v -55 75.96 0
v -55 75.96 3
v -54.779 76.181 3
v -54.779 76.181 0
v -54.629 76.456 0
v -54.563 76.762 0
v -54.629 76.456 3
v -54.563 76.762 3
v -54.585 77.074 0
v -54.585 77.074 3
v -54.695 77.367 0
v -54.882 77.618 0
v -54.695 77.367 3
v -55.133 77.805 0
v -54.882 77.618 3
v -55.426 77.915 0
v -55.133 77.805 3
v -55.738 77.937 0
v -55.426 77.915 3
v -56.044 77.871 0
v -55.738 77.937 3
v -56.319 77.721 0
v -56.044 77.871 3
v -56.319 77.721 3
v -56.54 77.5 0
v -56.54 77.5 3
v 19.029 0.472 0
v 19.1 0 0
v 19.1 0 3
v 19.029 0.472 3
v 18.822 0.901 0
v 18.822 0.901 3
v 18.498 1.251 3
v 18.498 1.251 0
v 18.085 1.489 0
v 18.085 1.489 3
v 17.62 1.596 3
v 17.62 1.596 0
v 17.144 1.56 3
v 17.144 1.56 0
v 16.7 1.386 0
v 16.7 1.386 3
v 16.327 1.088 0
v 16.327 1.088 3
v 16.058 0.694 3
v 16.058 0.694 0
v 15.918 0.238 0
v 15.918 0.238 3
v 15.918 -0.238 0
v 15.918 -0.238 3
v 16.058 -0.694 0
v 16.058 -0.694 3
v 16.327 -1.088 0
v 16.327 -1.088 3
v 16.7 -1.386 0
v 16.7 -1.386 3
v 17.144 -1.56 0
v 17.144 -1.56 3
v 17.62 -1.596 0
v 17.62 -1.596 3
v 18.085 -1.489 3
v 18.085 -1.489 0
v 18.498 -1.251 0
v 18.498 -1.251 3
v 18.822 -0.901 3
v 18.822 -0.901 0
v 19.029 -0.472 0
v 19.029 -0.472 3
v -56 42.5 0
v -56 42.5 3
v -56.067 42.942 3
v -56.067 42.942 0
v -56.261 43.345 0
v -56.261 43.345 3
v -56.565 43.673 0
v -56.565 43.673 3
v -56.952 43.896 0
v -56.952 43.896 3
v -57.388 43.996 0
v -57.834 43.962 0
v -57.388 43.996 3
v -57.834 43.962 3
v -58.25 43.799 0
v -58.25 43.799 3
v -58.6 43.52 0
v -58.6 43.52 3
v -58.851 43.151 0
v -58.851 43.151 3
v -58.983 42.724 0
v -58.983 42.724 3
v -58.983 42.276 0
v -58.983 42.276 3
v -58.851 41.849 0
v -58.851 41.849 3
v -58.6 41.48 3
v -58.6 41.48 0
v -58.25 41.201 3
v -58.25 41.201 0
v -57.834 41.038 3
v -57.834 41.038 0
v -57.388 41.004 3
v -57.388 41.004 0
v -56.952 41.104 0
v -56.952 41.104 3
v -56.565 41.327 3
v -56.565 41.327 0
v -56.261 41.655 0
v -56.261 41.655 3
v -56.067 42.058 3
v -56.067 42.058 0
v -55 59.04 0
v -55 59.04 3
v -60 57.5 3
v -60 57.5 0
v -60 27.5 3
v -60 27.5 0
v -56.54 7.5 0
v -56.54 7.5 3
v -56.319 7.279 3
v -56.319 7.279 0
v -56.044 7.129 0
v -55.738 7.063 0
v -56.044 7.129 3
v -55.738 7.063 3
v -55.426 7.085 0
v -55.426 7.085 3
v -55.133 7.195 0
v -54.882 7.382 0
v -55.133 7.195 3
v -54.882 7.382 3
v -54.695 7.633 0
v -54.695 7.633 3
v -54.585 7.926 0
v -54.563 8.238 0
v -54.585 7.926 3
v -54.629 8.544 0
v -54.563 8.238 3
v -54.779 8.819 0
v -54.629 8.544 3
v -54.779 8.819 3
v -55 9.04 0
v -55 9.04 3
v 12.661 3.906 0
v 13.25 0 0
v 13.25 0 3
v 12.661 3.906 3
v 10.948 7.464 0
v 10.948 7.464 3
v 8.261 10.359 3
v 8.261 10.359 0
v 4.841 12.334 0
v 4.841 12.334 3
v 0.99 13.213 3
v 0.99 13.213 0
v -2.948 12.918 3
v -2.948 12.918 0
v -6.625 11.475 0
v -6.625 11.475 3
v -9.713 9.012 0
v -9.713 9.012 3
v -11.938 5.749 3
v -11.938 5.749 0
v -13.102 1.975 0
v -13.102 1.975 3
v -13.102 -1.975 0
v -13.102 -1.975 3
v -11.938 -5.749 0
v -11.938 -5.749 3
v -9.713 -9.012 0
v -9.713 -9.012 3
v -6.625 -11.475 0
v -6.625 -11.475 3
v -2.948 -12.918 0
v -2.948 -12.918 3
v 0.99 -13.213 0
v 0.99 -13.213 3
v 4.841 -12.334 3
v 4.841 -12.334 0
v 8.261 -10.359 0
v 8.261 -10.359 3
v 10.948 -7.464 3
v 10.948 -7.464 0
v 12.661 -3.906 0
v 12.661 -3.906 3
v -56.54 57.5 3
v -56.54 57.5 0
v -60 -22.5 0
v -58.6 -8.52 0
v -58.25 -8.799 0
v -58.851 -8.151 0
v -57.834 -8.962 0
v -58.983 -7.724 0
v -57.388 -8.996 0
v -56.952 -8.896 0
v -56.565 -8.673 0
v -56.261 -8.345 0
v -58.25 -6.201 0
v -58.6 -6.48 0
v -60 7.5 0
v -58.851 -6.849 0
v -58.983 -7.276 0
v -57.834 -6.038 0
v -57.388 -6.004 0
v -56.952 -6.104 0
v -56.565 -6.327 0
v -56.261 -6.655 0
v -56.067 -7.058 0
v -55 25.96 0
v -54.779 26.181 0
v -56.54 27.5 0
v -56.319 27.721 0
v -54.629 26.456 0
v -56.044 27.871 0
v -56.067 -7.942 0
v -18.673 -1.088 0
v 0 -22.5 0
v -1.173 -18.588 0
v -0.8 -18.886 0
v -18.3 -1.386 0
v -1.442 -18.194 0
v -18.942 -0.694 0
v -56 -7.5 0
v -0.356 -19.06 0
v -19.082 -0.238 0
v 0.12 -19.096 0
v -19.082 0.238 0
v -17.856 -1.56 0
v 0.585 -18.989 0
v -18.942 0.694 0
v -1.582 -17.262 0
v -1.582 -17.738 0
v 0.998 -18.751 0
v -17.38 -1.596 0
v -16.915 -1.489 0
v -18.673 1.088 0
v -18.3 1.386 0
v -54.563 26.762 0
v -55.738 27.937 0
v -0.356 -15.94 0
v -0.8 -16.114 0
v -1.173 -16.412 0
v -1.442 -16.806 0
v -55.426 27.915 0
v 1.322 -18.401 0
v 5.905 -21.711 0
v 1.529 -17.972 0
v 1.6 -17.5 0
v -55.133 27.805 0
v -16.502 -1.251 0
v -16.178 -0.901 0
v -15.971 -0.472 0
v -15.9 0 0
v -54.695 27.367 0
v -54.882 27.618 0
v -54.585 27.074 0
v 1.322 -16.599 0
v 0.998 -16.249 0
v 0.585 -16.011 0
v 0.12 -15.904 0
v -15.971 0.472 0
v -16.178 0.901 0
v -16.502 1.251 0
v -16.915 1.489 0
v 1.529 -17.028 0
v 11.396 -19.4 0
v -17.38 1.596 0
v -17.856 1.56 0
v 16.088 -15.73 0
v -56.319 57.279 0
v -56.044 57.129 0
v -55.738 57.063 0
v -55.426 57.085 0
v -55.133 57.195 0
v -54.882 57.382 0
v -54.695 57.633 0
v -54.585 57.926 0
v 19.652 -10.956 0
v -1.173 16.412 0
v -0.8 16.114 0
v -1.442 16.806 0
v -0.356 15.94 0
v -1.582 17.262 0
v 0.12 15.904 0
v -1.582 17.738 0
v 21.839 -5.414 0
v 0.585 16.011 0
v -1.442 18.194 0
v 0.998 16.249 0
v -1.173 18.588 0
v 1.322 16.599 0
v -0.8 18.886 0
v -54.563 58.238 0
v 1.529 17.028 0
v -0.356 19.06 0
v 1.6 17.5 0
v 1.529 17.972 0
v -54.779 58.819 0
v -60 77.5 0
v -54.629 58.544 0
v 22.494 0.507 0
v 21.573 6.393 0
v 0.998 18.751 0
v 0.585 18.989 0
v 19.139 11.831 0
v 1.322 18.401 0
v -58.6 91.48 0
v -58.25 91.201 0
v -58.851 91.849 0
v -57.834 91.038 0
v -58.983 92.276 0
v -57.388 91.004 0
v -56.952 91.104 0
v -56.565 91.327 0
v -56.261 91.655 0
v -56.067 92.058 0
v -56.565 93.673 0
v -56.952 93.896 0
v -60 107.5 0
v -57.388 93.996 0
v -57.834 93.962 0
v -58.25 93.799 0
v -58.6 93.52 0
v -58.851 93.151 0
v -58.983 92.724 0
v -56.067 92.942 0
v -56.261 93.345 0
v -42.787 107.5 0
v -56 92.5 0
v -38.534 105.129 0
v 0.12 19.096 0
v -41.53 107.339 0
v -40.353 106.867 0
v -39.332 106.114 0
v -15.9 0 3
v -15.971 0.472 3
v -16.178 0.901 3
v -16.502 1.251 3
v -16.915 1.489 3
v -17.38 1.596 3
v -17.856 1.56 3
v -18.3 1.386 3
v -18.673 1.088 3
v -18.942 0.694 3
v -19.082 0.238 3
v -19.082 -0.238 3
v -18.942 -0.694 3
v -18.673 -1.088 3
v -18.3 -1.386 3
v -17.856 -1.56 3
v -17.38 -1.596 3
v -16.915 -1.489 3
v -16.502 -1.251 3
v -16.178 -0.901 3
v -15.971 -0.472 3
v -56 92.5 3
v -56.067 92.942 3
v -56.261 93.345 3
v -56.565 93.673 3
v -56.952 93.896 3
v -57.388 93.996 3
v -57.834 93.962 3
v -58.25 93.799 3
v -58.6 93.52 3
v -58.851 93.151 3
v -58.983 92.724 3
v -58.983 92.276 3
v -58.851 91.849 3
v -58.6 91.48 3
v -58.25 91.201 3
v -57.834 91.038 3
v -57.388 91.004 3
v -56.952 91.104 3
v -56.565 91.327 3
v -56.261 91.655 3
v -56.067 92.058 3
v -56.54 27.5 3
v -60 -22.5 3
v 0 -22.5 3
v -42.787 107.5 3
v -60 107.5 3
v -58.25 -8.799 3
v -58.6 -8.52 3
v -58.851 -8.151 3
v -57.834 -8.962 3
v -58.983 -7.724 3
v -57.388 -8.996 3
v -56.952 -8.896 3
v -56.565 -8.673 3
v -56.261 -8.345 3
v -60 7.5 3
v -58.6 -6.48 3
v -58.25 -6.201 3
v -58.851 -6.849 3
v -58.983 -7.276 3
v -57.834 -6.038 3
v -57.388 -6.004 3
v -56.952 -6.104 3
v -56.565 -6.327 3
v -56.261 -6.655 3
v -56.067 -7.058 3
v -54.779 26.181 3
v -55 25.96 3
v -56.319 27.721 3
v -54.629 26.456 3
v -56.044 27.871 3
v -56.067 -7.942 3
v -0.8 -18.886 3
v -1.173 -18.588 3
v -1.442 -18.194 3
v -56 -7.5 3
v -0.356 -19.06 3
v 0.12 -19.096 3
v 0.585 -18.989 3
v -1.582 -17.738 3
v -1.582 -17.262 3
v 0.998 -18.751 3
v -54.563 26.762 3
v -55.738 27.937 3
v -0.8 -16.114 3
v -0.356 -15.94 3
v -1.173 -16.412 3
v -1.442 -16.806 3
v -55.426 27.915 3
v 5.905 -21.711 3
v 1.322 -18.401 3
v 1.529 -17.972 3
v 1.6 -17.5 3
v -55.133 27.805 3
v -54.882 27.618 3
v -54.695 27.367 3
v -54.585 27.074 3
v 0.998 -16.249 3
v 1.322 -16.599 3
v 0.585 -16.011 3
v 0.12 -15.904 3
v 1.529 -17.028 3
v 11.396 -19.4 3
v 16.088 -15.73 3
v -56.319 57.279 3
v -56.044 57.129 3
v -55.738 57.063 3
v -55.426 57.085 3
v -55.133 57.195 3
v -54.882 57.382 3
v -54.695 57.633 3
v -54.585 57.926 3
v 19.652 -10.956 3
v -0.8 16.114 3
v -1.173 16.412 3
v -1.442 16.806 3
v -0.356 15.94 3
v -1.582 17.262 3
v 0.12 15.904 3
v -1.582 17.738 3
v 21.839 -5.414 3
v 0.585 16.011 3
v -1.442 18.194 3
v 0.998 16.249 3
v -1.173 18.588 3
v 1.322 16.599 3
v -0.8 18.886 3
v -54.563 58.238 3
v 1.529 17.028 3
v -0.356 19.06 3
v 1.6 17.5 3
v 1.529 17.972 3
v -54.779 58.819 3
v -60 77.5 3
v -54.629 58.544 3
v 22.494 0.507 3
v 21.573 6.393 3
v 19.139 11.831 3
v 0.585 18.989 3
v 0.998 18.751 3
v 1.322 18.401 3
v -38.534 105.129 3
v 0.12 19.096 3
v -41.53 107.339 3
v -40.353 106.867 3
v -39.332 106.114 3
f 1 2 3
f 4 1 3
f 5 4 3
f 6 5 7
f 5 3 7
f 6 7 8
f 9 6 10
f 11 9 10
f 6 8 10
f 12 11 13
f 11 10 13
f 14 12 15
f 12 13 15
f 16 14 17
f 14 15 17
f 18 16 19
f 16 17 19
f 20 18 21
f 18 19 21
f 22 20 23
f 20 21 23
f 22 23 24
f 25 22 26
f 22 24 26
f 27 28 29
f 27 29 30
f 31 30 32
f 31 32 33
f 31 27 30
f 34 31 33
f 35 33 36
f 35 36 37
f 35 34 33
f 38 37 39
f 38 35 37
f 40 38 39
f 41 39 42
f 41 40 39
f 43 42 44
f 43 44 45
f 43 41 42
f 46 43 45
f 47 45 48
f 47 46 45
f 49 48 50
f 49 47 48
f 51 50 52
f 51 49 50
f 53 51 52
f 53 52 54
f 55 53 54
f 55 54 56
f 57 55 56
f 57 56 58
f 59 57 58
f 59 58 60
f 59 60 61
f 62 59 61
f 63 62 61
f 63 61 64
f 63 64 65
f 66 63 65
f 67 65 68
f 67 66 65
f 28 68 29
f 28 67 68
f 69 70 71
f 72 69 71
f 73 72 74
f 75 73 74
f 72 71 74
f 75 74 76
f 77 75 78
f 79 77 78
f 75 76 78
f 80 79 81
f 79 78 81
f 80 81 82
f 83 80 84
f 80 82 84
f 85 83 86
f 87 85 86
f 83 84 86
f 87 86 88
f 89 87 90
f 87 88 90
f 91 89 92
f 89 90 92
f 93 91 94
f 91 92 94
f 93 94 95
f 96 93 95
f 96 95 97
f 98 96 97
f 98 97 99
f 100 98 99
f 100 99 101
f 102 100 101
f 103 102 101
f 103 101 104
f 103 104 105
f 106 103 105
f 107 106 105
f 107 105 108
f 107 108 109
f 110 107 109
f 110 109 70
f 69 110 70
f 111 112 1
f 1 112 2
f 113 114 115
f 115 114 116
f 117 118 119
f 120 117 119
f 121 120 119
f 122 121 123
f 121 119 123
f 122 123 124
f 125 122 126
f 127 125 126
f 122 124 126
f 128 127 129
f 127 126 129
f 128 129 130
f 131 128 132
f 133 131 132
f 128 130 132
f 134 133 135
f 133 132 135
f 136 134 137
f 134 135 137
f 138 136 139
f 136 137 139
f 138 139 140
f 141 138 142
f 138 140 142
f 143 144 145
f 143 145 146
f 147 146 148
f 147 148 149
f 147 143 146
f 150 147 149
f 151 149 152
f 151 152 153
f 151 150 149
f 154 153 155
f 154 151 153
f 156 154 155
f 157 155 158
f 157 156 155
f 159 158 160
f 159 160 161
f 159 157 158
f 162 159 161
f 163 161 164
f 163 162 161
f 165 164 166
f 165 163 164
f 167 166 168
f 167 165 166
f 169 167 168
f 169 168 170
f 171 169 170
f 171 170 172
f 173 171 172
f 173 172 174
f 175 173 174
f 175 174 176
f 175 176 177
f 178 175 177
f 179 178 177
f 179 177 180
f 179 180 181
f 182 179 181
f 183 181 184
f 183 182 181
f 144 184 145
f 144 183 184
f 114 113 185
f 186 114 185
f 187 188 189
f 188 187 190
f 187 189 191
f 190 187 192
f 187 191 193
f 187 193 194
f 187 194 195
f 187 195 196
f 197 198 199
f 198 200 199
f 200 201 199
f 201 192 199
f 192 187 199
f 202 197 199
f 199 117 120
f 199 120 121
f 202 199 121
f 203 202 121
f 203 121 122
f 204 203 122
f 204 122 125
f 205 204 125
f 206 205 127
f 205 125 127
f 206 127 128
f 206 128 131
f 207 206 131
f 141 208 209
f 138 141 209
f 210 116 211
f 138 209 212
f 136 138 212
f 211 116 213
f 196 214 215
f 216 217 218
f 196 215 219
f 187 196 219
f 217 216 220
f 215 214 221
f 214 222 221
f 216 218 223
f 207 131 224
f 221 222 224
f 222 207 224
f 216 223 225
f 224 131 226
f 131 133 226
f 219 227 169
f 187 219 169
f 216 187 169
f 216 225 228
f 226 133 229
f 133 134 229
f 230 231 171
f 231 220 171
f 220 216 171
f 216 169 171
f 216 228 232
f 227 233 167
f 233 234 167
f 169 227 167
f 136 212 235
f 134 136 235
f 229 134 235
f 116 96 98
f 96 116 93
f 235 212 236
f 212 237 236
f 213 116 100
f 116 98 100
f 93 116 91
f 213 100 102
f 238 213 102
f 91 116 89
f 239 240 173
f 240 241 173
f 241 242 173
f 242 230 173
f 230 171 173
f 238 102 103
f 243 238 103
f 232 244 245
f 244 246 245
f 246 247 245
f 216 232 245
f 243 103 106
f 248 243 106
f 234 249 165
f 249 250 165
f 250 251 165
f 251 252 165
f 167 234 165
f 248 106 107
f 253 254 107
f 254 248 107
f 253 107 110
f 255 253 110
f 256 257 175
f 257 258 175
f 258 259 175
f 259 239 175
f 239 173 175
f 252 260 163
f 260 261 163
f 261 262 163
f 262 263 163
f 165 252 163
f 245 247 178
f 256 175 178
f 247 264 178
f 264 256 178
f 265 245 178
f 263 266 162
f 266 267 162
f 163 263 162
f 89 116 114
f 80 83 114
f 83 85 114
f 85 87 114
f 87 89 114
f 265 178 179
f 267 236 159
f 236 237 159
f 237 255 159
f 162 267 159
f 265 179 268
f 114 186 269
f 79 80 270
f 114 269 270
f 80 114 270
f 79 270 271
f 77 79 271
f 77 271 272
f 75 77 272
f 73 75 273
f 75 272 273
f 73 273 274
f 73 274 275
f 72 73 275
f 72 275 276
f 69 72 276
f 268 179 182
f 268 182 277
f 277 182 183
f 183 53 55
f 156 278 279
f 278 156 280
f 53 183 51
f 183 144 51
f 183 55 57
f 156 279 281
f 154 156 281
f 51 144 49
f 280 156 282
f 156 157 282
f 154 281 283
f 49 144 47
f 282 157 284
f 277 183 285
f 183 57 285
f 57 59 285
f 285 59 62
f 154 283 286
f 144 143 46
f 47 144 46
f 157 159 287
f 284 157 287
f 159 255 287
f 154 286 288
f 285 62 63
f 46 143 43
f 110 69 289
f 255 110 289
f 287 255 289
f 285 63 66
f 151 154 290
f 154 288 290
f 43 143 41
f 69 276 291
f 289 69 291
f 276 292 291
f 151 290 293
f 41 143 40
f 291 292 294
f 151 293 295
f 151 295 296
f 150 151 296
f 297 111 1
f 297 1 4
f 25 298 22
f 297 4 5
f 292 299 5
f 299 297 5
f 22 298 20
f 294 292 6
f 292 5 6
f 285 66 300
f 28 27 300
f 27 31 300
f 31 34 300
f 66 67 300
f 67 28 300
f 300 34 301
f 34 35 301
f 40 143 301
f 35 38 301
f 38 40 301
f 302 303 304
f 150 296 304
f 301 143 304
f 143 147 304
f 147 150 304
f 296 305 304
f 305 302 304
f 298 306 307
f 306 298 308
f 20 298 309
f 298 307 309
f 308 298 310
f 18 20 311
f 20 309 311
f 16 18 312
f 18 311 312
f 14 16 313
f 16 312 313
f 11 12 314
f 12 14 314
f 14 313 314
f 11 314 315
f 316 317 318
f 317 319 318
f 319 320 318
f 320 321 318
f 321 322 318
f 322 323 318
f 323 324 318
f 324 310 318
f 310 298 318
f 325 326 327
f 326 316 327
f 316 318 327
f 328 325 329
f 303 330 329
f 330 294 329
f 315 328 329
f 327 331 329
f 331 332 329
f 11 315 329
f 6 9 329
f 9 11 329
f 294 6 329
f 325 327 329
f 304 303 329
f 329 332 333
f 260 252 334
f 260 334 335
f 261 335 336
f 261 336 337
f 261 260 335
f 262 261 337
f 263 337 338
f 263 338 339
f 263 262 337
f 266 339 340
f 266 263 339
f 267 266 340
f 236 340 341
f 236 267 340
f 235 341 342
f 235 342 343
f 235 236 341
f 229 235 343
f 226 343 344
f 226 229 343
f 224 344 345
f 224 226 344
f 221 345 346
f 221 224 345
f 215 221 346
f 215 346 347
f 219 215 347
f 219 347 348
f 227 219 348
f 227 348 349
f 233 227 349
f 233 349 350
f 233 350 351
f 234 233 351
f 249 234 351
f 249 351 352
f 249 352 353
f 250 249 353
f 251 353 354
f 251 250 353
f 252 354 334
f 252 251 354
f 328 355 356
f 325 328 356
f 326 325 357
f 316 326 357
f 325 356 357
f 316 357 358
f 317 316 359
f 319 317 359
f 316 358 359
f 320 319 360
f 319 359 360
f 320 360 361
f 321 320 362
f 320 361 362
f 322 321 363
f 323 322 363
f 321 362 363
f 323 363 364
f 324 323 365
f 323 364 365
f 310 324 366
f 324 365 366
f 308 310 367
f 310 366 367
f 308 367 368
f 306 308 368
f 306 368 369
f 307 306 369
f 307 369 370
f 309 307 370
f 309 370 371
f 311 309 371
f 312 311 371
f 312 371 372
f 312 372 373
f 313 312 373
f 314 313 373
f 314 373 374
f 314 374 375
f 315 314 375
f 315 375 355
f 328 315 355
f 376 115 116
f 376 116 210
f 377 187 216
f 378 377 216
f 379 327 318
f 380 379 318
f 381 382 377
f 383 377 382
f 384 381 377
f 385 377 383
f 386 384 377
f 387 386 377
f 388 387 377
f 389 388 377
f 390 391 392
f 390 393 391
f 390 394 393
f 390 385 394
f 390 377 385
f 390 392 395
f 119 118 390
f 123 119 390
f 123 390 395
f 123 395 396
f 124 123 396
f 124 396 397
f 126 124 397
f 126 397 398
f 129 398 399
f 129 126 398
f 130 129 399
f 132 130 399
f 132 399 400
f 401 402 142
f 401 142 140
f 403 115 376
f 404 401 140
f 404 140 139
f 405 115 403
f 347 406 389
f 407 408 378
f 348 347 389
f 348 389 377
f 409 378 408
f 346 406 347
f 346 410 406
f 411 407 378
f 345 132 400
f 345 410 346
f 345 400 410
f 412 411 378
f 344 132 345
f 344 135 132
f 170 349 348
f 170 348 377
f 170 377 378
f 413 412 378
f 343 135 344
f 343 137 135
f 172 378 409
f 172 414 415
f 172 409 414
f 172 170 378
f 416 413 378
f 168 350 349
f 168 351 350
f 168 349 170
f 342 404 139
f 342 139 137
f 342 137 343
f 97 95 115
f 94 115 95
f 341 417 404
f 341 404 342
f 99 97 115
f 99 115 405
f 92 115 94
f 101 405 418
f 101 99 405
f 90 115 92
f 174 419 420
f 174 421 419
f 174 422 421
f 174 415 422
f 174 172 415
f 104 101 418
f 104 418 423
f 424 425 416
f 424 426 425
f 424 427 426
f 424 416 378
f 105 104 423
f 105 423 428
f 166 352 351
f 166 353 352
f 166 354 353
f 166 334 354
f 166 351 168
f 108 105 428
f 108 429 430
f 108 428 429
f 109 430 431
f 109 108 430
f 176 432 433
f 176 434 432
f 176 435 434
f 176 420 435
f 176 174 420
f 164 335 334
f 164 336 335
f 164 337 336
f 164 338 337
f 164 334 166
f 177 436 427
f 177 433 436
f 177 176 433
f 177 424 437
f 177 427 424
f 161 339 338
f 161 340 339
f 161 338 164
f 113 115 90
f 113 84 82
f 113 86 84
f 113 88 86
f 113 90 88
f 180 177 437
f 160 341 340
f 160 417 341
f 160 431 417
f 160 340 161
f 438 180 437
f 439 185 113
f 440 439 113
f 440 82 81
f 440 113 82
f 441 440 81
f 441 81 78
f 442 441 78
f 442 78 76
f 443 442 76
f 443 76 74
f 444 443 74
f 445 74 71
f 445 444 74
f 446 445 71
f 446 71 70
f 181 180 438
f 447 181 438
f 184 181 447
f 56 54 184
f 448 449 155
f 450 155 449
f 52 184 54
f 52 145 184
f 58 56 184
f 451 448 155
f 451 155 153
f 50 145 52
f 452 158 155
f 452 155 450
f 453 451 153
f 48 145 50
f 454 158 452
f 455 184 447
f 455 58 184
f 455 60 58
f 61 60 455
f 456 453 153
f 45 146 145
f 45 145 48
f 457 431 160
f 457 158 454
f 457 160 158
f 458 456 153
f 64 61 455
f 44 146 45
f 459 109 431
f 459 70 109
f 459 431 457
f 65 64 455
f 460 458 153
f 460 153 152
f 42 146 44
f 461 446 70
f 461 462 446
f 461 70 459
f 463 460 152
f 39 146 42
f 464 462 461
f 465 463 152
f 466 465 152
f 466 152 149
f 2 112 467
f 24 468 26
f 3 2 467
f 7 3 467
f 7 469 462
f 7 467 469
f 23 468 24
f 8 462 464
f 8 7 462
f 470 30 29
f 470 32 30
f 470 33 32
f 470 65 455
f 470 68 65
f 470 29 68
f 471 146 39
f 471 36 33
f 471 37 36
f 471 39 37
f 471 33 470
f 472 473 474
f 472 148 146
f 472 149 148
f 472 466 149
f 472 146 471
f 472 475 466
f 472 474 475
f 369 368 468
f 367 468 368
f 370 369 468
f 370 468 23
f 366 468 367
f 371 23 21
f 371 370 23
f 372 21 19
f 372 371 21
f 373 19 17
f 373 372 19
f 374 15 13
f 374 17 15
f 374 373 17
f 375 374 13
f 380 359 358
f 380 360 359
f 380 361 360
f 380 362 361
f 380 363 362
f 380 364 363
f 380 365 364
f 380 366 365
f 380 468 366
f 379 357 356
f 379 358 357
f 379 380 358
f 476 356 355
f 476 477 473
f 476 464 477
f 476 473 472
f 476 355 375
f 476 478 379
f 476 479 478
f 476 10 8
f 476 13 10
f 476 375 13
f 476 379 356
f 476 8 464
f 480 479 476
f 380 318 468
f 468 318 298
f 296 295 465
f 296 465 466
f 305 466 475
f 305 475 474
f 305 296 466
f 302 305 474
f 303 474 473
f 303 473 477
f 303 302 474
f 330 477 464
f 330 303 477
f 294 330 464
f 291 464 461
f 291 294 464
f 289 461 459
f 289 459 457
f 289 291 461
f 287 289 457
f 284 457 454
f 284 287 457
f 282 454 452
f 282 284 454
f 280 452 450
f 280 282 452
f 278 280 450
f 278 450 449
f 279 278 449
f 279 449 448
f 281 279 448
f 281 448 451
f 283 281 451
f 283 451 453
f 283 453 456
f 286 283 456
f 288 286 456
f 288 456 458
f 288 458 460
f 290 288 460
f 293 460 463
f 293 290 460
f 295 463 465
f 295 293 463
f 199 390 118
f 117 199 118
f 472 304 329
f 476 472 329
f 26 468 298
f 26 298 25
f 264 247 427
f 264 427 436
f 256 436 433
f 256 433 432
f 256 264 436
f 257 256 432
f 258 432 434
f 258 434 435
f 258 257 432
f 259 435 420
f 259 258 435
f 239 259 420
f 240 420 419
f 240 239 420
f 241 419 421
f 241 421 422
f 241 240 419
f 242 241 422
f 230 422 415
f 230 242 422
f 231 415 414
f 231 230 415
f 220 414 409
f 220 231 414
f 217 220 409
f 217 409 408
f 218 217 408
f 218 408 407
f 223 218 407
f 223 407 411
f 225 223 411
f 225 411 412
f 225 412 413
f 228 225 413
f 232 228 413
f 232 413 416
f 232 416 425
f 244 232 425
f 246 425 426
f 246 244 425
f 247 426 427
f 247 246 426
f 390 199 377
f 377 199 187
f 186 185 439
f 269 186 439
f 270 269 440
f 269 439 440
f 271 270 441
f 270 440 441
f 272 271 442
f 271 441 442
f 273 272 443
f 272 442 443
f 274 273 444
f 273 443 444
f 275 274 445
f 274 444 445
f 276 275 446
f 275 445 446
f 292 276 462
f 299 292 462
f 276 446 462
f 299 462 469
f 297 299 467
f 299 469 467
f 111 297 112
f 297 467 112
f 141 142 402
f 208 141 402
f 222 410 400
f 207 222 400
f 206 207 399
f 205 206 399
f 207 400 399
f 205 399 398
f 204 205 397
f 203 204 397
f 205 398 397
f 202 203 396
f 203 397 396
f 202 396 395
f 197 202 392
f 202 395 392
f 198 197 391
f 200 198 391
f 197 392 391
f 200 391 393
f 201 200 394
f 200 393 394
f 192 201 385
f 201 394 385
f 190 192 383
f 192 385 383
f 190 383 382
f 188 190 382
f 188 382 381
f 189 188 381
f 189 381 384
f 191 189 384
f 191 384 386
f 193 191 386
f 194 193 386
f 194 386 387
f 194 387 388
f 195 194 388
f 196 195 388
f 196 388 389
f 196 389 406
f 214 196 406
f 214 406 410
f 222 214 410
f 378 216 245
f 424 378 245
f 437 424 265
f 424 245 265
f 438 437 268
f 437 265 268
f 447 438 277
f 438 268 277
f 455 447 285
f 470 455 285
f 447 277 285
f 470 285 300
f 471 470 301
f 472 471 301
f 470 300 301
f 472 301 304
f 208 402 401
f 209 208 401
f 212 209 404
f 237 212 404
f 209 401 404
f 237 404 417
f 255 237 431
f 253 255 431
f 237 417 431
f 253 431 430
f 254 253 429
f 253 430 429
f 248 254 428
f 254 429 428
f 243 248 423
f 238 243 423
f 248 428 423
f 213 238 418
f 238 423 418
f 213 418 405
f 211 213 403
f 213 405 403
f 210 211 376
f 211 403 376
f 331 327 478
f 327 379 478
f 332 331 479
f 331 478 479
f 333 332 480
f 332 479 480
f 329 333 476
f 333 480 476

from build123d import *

# Parameters (mm, degrees)
SKETCH_2_R          = 13.25
SKETCH_2_R_2        = 1.6
EXTRUDE_1_DEPTH     = 3
FILLET_3_R          = 5
SKETCH_4_R          = 1.5
SKETCH_4_R_2        = 1.1
SKETCH_4_W          = 5
SKETCH_4_H          = 20
CUT_EXTRUDE_1_DEPTH = 10


with BuildPart() as part:
    # ｽｹｯﾁ2 → ﾎﾞｽ - 押し出し1 (new body)
    with BuildSketch(Plane.XY):
        with BuildLine():
            Line((-60, -22.5), (-40, -22.5))
            Line((-40, -22.5), (0, -22.5))
            ThreePointArc((0, -22.5), (19.65247344, -10.9558335), (19.138597944, 11.830641096))
            Line((19.138597944, 11.830641096), (-40, 107.5))
            Line((-40, 107.5), (-60, 107.5))
            Line((-60, 107.5), (-60, -22.5))
        make_face()
        Circle(SKETCH_2_R, mode=Mode.SUBTRACT)
        with Locations((0, 17.5)):
            Circle(SKETCH_2_R_2, mode=Mode.SUBTRACT)
        with Locations((17.5, 0)):
            Circle(SKETCH_2_R_2, mode=Mode.SUBTRACT)
        with Locations((0, -17.5)):
            Circle(SKETCH_2_R_2, mode=Mode.SUBTRACT)
        with Locations((-17.5, 0)):
            Circle(SKETCH_2_R_2, mode=Mode.SUBTRACT)
    extrude(amount=EXTRUDE_1_DEPTH)

    # ﾌｨﾚｯﾄ3
    fillet_3_edges = [part.edges().sort_by_distance(p)[0] for p in [
        (-40, 107.5, 1.5),
    ]]
    fillet(fillet_3_edges, radius=FILLET_3_R)

    # ｽｹｯﾁ4 → ｶｯﾄ - 押し出し1 (cut)
    with BuildSketch(Plane.XY.offset(3)):
        with Locations((-57.5, -7.5)):
            Circle(SKETCH_4_R)
        with Locations((-57.5, 42.5)):
            Circle(SKETCH_4_R)
        with Locations((-57.5, 92.5)):
            Circle(SKETCH_4_R)
        with Locations((-55.66, 26.84)):
            Circle(SKETCH_4_R_2)
        with Locations((-55.66, 8.16)):
            Circle(SKETCH_4_R_2)
        with Locations((-55.66, 58.16)):
            Circle(SKETCH_4_R_2)
        with Locations((-55.66, 76.84)):
            Circle(SKETCH_4_R_2)
        with Locations((-57.5, 67.5)):
            Rectangle(SKETCH_4_W, SKETCH_4_H)
        with Locations((-57.5, 17.5)):
            Rectangle(SKETCH_4_W, SKETCH_4_H)
    extrude(amount=-CUT_EXTRUDE_1_DEPTH, mode=Mode.SUBTRACT)


solid = part.part
